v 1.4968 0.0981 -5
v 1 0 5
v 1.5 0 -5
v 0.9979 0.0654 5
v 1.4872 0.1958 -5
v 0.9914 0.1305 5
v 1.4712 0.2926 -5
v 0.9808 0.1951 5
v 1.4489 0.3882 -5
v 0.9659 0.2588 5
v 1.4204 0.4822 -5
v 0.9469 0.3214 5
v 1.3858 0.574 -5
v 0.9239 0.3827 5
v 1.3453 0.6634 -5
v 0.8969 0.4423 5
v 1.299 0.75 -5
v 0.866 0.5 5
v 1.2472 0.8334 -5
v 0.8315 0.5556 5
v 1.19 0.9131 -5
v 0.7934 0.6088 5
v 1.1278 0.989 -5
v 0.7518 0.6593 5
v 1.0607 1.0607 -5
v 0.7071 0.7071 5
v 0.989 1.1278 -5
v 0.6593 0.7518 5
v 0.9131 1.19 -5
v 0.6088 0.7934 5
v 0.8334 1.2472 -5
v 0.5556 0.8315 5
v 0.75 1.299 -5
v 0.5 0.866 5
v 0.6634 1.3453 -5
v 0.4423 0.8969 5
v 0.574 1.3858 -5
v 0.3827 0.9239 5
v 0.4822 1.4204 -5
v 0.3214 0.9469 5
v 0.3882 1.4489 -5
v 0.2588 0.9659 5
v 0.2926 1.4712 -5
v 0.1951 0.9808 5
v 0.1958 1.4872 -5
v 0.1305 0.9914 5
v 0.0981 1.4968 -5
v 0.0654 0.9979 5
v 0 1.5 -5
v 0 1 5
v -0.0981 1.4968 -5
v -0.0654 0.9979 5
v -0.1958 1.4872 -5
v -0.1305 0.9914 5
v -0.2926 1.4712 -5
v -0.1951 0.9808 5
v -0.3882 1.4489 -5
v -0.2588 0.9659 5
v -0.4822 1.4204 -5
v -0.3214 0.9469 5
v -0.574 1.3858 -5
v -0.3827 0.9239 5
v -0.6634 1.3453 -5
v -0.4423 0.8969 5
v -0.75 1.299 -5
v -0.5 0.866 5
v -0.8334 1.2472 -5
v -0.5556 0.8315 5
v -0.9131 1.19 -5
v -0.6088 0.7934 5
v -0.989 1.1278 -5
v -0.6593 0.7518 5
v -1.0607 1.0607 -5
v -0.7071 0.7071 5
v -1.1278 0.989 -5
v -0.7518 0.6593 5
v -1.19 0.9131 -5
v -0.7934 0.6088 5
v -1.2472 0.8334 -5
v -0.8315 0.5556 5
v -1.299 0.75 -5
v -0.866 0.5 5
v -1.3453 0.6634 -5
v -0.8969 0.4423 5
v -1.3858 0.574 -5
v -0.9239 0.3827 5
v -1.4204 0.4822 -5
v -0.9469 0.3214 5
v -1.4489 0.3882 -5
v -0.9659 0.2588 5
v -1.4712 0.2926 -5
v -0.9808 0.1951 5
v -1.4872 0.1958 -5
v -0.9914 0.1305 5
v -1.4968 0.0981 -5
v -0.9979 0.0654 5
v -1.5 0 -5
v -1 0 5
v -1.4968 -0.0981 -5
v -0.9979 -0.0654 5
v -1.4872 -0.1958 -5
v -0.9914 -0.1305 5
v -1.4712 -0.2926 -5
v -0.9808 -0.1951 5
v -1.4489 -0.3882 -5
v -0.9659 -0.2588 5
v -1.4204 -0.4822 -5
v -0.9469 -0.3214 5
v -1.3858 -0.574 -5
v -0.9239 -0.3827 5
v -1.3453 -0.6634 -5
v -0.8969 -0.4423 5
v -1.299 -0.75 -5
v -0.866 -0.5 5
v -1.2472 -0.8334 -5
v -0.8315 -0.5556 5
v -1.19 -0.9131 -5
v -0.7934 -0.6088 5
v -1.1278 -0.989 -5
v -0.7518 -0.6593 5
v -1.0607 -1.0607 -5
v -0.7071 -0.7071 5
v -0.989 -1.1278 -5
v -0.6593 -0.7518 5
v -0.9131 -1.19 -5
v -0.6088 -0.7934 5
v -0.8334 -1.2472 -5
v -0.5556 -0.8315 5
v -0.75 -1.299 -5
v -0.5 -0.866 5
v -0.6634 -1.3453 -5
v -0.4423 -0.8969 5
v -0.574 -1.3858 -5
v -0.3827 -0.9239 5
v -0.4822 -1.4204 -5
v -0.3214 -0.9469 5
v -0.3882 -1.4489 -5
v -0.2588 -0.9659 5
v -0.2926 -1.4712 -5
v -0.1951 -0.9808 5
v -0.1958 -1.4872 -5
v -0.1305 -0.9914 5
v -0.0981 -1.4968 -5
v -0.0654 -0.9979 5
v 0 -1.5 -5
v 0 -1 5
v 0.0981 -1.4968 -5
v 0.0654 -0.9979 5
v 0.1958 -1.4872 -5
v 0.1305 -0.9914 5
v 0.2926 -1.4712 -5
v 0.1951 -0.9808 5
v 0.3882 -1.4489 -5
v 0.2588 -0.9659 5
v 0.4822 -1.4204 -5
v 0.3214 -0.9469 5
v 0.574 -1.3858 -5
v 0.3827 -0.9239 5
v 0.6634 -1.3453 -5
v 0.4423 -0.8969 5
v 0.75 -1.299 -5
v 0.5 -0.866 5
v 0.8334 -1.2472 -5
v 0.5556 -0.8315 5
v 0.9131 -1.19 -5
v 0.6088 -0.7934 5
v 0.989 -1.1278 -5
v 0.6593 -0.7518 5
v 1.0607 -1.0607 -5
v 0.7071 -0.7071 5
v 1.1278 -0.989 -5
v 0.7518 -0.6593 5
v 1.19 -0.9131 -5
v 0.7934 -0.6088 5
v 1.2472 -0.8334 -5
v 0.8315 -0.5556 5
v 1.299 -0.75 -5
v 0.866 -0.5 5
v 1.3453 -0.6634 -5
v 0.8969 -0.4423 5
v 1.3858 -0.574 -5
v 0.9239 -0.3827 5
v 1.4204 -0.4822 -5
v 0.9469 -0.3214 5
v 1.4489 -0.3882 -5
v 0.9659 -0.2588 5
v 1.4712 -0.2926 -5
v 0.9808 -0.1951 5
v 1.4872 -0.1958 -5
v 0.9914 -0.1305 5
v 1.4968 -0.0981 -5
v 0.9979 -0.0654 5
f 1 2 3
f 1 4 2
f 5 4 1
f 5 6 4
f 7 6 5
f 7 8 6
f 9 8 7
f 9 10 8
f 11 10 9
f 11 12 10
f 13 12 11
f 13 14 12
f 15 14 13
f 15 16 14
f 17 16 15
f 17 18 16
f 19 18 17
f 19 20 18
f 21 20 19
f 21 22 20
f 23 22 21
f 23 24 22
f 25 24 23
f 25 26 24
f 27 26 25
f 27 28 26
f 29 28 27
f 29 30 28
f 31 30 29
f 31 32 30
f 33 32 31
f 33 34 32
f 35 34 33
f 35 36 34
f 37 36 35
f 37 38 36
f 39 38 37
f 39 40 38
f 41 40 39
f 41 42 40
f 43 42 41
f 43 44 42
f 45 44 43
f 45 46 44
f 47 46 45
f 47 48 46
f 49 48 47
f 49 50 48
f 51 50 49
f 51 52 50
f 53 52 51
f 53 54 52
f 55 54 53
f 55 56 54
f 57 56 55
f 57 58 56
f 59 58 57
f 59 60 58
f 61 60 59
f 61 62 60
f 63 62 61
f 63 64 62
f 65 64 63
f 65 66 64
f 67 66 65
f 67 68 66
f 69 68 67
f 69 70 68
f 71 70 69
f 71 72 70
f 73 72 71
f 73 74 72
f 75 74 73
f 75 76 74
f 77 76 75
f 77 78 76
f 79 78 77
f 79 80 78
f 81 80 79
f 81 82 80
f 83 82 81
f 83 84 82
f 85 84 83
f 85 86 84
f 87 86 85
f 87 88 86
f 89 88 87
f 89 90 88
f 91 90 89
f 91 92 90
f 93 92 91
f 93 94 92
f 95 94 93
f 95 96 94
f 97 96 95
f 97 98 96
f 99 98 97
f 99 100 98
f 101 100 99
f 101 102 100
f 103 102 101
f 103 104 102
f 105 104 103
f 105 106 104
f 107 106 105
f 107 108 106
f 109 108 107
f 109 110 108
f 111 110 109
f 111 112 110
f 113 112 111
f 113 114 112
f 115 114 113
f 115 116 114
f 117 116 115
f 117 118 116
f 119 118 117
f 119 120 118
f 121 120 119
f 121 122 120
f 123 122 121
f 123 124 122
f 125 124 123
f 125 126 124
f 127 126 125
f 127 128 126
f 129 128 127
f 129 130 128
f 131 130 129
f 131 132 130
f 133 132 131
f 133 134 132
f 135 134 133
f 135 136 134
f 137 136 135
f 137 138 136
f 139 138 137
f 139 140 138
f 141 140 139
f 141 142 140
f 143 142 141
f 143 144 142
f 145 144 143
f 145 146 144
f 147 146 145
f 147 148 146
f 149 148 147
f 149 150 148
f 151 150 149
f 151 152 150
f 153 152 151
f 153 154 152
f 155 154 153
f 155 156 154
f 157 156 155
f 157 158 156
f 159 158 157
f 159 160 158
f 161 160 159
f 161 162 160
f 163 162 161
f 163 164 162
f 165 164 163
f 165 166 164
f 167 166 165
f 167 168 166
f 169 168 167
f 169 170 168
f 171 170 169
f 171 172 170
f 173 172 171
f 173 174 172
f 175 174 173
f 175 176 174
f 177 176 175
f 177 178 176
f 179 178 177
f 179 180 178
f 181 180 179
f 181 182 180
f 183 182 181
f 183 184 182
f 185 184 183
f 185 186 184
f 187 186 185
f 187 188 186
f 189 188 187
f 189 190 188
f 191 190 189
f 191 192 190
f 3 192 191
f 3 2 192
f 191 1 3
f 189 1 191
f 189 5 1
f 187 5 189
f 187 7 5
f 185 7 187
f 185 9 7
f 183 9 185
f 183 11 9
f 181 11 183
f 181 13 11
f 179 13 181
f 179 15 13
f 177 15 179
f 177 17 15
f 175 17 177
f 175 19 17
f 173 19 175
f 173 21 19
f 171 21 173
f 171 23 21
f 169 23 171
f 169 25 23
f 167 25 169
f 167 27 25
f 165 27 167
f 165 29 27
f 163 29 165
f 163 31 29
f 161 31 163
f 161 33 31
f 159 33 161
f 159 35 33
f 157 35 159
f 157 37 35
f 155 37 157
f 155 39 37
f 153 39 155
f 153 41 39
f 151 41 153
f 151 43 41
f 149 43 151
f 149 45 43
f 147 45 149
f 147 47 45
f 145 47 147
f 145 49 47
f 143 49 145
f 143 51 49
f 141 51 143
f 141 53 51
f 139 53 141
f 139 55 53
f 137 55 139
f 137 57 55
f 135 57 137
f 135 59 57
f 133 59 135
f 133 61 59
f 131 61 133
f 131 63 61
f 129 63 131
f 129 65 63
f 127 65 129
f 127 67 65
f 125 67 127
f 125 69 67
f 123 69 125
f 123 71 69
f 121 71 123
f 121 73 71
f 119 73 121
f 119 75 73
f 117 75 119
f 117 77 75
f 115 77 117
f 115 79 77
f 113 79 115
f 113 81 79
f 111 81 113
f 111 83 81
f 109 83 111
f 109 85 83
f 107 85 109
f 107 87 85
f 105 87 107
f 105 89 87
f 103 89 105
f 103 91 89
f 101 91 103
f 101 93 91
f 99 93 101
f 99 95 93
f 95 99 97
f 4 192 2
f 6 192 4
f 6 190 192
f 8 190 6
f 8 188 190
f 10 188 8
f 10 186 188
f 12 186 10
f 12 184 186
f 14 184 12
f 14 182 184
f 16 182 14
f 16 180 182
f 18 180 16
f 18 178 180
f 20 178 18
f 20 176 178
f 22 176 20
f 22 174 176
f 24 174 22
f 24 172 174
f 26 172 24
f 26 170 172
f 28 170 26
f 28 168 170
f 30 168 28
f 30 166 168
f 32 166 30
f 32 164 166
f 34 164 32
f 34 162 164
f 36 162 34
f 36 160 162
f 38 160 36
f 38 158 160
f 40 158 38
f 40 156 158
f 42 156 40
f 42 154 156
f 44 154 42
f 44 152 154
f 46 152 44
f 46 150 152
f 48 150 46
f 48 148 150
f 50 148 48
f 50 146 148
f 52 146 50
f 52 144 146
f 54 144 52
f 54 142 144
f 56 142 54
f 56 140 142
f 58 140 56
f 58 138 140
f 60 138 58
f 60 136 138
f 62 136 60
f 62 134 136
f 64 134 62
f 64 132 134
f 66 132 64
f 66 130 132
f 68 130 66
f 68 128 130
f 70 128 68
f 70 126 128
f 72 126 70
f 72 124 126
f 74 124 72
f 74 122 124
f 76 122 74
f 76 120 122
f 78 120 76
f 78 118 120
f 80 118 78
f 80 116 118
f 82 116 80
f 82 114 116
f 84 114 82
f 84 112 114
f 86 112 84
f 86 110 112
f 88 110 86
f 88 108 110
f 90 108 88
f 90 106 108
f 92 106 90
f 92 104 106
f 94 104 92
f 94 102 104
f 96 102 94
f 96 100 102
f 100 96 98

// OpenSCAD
// Unit of length: Unit.MM
cylinder(h = 10.0, d1 = 3.0, d2 = 2.0, center = true, $fn = 96);
